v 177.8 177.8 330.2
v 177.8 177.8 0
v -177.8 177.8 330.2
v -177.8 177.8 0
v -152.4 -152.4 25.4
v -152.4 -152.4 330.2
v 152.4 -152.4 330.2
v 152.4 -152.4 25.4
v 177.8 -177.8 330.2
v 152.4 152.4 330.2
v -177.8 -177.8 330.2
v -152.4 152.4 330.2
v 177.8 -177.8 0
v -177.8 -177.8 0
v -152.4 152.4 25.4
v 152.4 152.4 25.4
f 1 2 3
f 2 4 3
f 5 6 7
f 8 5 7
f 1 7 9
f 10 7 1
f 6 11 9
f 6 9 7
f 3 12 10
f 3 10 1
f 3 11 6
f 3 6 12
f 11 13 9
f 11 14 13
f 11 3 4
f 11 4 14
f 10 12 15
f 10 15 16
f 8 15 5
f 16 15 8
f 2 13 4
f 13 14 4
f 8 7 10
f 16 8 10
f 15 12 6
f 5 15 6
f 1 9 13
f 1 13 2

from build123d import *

# Parameters (mm, degrees)
F0_W     = 304.8
F0_H     = 304.8
F1_DEPTH = 25.4
F2_W     = 304.8
F2_H     = 330.2
F3_DEPTH = 25.4
F5_W     = 355.6
F5_H     = 330.2
F6_DEPTH = 25.4
F7_W     = 355.6
F7_H     = 330.2
F8_DEPTH = 25.4


with BuildPart() as f1:
    # F0 (on Top) → F1 (new body)
    with BuildSketch(Plane.XY):
        Rectangle(F0_W, F0_H)
    extrude(amount=F1_DEPTH)

    # F2 (on face) → F3 (join)
    with BuildSketch(Plane.XZ.offset(152.4)):
        with Locations((0, 165.1)):
            Rectangle(F2_W, F2_H)
    extrude(amount=F3_DEPTH)

    # F4: F1 across plane


with BuildPart() as f1_1:
    add(f1.part)
    add(f1.part.mirror(Plane.XZ))

    # F5 (on face) → F6 (join)
    with BuildSketch(Plane(origin=(-152.4, 0, 0), x_dir=(0, -1, 0), z_dir=(-1, 0, 0))):
        with Locations((0, 165.1)):
            Rectangle(F5_W, F5_H)
    extrude(amount=F6_DEPTH)

    # F7 (on face) → F8 (join)
    with BuildSketch(Plane.YZ.offset(152.4)):
        with Locations((0, 165.1)):
            Rectangle(F7_W, F7_H)
    extrude(amount=F8_DEPTH)


solid = f1_1.part
